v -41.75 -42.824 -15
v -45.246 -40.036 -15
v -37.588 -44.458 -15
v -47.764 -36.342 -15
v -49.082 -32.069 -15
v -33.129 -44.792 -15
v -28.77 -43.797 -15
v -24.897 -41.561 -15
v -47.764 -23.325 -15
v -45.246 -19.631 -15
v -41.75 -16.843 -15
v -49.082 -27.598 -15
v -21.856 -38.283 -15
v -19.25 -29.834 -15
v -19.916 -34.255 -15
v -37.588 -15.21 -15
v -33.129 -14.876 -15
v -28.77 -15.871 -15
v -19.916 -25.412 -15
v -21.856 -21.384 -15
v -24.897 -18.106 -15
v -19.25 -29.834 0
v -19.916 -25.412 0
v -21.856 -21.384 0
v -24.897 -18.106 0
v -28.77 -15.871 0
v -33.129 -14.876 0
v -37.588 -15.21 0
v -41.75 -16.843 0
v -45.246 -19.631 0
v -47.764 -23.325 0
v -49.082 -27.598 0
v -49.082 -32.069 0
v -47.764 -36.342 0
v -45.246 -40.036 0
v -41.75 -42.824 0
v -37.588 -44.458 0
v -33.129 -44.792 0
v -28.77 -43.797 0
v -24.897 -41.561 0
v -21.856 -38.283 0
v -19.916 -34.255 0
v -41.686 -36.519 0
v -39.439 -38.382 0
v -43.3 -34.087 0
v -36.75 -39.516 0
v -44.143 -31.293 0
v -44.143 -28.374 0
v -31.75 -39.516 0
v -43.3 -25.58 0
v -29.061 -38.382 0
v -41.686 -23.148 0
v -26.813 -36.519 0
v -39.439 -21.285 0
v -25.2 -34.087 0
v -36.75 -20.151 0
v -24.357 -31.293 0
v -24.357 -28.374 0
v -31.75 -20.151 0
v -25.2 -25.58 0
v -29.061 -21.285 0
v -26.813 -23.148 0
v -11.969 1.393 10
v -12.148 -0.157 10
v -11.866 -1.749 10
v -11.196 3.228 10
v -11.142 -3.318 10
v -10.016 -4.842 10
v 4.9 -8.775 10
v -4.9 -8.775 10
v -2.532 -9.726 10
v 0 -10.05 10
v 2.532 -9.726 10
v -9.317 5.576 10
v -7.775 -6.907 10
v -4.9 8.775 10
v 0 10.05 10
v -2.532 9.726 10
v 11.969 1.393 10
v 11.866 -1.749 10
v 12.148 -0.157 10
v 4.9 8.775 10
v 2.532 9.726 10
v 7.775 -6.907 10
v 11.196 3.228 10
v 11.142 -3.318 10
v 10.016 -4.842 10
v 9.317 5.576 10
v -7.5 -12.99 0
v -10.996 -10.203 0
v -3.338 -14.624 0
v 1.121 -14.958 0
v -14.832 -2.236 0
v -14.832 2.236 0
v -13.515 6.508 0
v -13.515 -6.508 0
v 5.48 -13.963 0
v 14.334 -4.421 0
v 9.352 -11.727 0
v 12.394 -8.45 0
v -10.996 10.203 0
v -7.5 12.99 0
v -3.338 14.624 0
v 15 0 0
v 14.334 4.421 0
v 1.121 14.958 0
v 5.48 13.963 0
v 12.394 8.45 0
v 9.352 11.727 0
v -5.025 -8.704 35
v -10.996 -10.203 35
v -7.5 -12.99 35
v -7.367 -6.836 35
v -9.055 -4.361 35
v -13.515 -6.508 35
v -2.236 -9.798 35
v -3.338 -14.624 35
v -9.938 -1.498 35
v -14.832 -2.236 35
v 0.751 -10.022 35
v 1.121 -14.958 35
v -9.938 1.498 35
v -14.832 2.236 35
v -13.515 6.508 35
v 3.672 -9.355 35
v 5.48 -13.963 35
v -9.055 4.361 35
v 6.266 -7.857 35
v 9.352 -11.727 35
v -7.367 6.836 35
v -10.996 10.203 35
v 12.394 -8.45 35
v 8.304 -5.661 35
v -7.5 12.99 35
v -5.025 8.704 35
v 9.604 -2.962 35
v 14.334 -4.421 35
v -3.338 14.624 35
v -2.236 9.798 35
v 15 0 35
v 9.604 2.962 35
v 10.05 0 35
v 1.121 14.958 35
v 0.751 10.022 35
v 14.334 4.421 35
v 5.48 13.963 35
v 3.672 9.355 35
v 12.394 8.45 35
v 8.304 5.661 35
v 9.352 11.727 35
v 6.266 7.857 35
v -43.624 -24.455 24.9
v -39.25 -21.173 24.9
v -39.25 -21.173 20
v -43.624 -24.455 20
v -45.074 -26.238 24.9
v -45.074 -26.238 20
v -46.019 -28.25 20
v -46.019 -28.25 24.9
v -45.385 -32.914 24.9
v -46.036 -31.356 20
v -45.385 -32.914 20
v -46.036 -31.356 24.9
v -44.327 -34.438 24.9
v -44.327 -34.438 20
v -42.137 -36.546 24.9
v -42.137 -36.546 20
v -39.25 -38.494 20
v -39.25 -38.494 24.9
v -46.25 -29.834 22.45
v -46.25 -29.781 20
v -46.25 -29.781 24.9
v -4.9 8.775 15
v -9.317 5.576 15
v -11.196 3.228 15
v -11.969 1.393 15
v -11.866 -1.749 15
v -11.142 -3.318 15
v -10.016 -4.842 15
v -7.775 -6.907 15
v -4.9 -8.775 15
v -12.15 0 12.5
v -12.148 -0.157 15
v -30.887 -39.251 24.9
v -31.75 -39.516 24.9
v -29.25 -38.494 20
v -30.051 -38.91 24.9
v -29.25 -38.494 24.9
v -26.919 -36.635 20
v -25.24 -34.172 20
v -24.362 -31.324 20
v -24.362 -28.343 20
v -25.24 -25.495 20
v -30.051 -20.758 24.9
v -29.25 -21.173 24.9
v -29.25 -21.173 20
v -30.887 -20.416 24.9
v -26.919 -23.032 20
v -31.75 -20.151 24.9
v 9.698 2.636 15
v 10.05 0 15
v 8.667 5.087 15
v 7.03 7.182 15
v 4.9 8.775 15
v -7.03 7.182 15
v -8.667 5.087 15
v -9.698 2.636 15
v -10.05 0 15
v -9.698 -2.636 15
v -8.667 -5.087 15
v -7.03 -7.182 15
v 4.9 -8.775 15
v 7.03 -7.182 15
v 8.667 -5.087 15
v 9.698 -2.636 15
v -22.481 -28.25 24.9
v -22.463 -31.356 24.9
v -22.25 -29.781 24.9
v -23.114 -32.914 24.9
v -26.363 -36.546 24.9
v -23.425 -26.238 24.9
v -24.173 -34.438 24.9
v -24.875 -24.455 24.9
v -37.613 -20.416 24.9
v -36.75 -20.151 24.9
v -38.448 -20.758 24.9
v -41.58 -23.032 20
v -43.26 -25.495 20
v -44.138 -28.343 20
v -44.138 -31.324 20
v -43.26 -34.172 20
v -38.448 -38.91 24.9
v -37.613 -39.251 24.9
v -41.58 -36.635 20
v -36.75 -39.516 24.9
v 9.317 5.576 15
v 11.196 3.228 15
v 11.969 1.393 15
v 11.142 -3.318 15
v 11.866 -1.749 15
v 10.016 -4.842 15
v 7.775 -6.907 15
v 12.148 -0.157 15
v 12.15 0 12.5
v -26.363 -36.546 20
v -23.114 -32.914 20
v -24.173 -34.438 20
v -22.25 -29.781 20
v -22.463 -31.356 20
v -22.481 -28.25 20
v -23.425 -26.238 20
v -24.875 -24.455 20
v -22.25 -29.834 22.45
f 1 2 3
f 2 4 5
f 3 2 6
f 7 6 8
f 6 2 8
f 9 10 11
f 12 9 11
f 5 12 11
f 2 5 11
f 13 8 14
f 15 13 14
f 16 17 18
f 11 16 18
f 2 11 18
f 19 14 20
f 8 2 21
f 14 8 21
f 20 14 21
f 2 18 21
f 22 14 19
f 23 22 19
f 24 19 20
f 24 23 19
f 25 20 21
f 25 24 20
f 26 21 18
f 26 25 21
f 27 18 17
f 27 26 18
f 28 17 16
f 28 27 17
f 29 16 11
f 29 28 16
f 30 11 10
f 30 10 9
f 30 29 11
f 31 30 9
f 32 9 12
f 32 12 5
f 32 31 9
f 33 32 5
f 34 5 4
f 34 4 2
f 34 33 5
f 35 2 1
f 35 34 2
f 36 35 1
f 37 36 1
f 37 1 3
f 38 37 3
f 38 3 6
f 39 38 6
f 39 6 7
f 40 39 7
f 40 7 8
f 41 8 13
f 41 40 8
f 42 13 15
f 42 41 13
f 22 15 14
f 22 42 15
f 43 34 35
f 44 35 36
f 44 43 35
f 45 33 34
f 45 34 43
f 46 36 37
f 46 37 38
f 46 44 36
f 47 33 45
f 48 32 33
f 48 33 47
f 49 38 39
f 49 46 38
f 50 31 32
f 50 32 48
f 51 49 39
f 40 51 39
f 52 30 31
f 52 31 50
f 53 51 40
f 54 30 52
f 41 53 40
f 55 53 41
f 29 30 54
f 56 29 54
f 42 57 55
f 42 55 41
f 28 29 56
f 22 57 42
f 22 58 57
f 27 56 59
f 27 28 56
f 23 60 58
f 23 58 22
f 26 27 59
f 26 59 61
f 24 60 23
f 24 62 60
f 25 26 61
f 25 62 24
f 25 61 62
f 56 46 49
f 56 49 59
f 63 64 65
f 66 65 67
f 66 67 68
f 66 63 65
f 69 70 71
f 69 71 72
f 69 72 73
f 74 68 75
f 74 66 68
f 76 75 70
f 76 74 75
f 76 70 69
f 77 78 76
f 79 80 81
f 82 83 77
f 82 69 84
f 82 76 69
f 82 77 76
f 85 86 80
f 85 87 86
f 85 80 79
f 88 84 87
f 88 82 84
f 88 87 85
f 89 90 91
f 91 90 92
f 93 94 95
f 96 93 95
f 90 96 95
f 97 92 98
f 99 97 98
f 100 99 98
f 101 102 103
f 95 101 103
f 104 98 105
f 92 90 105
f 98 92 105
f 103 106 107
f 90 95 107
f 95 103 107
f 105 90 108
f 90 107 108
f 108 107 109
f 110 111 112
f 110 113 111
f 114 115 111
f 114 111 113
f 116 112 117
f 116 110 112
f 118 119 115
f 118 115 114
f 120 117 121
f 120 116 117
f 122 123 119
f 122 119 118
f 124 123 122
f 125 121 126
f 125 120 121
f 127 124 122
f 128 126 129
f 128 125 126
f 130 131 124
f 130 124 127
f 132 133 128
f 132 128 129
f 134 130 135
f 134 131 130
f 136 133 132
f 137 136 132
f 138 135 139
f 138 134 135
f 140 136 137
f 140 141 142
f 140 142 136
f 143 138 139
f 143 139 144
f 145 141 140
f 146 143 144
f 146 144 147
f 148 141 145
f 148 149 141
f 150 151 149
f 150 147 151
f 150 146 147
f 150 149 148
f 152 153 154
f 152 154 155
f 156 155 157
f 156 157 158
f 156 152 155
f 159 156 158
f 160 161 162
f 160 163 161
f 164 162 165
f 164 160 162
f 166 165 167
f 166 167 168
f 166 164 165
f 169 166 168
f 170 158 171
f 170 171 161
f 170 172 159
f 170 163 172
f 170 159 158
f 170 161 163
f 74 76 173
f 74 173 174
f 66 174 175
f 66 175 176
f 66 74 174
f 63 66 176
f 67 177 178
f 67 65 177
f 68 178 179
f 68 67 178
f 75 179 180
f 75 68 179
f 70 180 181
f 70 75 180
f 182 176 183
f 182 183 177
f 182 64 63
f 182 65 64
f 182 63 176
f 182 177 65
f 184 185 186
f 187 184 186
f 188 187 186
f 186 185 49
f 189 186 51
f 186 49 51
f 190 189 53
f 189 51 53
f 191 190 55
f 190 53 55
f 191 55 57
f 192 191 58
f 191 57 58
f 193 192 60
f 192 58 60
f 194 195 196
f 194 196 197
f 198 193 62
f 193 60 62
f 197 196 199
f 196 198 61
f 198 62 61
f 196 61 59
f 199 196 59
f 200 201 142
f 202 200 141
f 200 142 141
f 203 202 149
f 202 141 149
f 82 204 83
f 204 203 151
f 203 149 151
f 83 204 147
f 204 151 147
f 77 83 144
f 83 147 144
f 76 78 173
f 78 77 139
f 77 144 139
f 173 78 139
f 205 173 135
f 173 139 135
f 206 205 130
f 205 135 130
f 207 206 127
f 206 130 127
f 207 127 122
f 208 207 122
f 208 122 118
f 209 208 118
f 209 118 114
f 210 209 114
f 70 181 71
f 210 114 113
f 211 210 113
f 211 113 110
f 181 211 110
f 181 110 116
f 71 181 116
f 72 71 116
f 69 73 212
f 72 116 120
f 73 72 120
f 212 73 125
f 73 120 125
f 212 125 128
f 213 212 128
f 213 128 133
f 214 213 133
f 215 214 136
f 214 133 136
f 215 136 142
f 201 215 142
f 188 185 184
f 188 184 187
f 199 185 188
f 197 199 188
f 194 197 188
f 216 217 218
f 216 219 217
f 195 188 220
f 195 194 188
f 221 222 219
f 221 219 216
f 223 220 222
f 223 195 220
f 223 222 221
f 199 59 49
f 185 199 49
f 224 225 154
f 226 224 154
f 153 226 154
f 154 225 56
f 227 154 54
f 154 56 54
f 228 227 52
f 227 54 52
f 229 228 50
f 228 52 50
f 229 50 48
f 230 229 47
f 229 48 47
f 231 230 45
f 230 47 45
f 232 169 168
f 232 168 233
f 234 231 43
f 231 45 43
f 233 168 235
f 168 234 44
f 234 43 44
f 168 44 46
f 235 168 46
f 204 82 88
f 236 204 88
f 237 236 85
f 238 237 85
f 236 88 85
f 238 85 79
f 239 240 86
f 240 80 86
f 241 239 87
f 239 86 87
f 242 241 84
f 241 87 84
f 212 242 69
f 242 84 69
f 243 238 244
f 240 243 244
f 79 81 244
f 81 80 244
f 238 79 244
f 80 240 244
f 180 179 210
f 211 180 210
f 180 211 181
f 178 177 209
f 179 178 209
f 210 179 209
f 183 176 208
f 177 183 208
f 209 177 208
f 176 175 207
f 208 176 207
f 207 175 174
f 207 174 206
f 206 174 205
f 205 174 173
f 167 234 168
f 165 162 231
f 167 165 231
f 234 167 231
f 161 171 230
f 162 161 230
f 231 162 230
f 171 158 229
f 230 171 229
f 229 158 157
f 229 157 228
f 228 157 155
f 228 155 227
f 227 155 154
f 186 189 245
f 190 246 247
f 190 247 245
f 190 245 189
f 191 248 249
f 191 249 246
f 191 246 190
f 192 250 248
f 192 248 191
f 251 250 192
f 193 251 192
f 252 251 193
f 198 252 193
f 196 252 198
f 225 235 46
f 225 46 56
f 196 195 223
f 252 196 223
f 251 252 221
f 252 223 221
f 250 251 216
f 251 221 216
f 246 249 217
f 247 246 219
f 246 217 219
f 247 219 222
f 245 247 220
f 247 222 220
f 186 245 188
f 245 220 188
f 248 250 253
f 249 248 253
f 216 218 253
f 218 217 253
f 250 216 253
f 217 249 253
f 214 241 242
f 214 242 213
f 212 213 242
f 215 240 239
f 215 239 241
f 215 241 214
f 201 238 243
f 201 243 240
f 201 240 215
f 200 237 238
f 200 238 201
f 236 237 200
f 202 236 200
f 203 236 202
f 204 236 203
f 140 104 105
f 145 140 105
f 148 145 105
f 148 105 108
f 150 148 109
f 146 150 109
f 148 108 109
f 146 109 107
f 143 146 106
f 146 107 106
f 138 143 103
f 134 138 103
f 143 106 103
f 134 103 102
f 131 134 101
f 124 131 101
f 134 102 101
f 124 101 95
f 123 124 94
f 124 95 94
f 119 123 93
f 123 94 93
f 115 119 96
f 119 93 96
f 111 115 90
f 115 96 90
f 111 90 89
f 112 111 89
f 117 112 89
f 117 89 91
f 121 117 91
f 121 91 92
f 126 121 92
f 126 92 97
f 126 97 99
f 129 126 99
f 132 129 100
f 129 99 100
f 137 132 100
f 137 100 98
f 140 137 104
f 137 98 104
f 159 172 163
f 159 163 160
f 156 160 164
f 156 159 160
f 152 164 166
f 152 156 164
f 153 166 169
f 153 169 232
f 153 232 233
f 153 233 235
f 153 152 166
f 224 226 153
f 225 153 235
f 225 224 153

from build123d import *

# Parameters (mm, degrees)
F0_R      = 15
F1_DEPTH  = 35
F2_R      = 10.05
F3_DEPTH  = 25
F5_DEPTH  = 24.9
F6_R      = 15
F7_DEPTH  = 15
F9_DEPTH  = 4.9
F11_DEPTH = 5


with BuildPart() as f1:
    # F0 (on Top) → F1 (new body)
    with BuildSketch(Plane.XY):
        Circle(F0_R)
    extrude(amount=F1_DEPTH)

    # F2 (on face) → F3 (cut)
    with BuildSketch(Plane.XY.offset(35)):
        Circle(F2_R)
    extrude(amount=-F3_DEPTH, mode=Mode.SUBTRACT)

    # F10 (on face) → F11 (cut)
    with BuildSketch(Plane.XY.offset(10)):
        with BuildLine():
            ThreePointArc((-4.9, -8.7745370248), (-10.05, 0), (-4.9, 8.7745370248))
            add(Edge.make_bspline(
                [(-4.9, 8.7745370248), (-9.2730985357, 6.3504889236), (-15.0269014643, 0), (-9.2730985357, -6.3504889236), (-4.9, -8.7745370248)],
                knots=[0, 0, 0, 0, 0.5, 1, 1, 1, 1], degree=3))
        make_face()
        with BuildLine():
            add(Edge.make_bspline(
                [(4.9, 8.7745370248), (9.2730985357, 6.3504889236), (15.0269014643, 0), (9.2730985357, -6.3504889236), (4.9, -8.7745370248)],
                knots=[0, 0, 0, 0, 0.5, 1, 1, 1, 1], degree=3))
            ThreePointArc((4.9, 8.7745370248), (10.05, 0), (4.9, -8.7745370248))
        make_face()
    extrude(amount=F11_DEPTH, mode=Mode.SUBTRACT)


with BuildPart() as f5:
    # F4 (on Top) → F5 (new body)
    with BuildSketch(Plane.XY):
        with BuildLine():
            Line((-31.7498186064, -20.1511914093), (-31.7498186064, -39.5161081404))
            ThreePointArc((-31.7498186064, -39.5161081404), (-24.2498186064, -29.8336497748), (-31.7498186064, -20.1511914093))
        make_face()
    extrude(amount=F5_DEPTH)



with BuildPart() as f5b:
    # F4 (on Top) → F5, piece 2 (new body)
    with BuildSketch(Plane.XY):
        with BuildLine():
            Line((-36.7498186064, -39.5161081404), (-36.7498186064, -20.1511914093))
            ThreePointArc((-36.7498186064, -20.1511914093), (-44.2498186064, -29.8336497748), (-36.7498186064, -39.5161081404))
        make_face()
    extrude(amount=F5_DEPTH)


with BuildPart() as f5_1:
    add(f5.part)

    add(f5b.part)  # F7 merges F5b
    # F6 (on Top) → F7 (join)
    with BuildSketch(Plane.XY):
        with Locations((-34.2498186064, -29.8336497748)):
            Circle(F6_R)
    extrude(amount=-F7_DEPTH)

    # F8 (on face) → F9 (join)
    with BuildSketch(Plane.XY.offset(24.9)):
        with BuildLine():
            ThreePointArc((-39.2498186064, -38.4939038127), (-44.2498186064, -29.8336497748), (-39.2498186064, -21.173395737))
            add(Edge.make_bspline(
                [(-39.2498186064, -21.173395737), (-43.5799456253, -23.673395737), (-48.9196915875, -29.8336497748), (-43.5799456253, -35.9939038127), (-39.2498186064, -38.4939038127)],
                knots=[0, 0, 0, 0, 0.5, 1, 1, 1, 1], degree=3))
        make_face()
        with BuildLine():
            add(Edge.make_bspline(
                [(-29.2498186064, -21.173395737), (-24.9196915875, -23.673395737), (-19.5799456253, -29.8336497748), (-24.9196915875, -35.9939038127), (-29.2498186064, -38.4939038127)],
                knots=[0, 0, 0, 0, 0.5, 1, 1, 1, 1], degree=3))
            ThreePointArc((-29.2498186064, -21.173395737), (-24.2498186064, -29.8336497748), (-29.2498186064, -38.4939038127))
        make_face()
    extrude(amount=-F9_DEPTH)


solid = Compound([f1.part, f5_1.part])
